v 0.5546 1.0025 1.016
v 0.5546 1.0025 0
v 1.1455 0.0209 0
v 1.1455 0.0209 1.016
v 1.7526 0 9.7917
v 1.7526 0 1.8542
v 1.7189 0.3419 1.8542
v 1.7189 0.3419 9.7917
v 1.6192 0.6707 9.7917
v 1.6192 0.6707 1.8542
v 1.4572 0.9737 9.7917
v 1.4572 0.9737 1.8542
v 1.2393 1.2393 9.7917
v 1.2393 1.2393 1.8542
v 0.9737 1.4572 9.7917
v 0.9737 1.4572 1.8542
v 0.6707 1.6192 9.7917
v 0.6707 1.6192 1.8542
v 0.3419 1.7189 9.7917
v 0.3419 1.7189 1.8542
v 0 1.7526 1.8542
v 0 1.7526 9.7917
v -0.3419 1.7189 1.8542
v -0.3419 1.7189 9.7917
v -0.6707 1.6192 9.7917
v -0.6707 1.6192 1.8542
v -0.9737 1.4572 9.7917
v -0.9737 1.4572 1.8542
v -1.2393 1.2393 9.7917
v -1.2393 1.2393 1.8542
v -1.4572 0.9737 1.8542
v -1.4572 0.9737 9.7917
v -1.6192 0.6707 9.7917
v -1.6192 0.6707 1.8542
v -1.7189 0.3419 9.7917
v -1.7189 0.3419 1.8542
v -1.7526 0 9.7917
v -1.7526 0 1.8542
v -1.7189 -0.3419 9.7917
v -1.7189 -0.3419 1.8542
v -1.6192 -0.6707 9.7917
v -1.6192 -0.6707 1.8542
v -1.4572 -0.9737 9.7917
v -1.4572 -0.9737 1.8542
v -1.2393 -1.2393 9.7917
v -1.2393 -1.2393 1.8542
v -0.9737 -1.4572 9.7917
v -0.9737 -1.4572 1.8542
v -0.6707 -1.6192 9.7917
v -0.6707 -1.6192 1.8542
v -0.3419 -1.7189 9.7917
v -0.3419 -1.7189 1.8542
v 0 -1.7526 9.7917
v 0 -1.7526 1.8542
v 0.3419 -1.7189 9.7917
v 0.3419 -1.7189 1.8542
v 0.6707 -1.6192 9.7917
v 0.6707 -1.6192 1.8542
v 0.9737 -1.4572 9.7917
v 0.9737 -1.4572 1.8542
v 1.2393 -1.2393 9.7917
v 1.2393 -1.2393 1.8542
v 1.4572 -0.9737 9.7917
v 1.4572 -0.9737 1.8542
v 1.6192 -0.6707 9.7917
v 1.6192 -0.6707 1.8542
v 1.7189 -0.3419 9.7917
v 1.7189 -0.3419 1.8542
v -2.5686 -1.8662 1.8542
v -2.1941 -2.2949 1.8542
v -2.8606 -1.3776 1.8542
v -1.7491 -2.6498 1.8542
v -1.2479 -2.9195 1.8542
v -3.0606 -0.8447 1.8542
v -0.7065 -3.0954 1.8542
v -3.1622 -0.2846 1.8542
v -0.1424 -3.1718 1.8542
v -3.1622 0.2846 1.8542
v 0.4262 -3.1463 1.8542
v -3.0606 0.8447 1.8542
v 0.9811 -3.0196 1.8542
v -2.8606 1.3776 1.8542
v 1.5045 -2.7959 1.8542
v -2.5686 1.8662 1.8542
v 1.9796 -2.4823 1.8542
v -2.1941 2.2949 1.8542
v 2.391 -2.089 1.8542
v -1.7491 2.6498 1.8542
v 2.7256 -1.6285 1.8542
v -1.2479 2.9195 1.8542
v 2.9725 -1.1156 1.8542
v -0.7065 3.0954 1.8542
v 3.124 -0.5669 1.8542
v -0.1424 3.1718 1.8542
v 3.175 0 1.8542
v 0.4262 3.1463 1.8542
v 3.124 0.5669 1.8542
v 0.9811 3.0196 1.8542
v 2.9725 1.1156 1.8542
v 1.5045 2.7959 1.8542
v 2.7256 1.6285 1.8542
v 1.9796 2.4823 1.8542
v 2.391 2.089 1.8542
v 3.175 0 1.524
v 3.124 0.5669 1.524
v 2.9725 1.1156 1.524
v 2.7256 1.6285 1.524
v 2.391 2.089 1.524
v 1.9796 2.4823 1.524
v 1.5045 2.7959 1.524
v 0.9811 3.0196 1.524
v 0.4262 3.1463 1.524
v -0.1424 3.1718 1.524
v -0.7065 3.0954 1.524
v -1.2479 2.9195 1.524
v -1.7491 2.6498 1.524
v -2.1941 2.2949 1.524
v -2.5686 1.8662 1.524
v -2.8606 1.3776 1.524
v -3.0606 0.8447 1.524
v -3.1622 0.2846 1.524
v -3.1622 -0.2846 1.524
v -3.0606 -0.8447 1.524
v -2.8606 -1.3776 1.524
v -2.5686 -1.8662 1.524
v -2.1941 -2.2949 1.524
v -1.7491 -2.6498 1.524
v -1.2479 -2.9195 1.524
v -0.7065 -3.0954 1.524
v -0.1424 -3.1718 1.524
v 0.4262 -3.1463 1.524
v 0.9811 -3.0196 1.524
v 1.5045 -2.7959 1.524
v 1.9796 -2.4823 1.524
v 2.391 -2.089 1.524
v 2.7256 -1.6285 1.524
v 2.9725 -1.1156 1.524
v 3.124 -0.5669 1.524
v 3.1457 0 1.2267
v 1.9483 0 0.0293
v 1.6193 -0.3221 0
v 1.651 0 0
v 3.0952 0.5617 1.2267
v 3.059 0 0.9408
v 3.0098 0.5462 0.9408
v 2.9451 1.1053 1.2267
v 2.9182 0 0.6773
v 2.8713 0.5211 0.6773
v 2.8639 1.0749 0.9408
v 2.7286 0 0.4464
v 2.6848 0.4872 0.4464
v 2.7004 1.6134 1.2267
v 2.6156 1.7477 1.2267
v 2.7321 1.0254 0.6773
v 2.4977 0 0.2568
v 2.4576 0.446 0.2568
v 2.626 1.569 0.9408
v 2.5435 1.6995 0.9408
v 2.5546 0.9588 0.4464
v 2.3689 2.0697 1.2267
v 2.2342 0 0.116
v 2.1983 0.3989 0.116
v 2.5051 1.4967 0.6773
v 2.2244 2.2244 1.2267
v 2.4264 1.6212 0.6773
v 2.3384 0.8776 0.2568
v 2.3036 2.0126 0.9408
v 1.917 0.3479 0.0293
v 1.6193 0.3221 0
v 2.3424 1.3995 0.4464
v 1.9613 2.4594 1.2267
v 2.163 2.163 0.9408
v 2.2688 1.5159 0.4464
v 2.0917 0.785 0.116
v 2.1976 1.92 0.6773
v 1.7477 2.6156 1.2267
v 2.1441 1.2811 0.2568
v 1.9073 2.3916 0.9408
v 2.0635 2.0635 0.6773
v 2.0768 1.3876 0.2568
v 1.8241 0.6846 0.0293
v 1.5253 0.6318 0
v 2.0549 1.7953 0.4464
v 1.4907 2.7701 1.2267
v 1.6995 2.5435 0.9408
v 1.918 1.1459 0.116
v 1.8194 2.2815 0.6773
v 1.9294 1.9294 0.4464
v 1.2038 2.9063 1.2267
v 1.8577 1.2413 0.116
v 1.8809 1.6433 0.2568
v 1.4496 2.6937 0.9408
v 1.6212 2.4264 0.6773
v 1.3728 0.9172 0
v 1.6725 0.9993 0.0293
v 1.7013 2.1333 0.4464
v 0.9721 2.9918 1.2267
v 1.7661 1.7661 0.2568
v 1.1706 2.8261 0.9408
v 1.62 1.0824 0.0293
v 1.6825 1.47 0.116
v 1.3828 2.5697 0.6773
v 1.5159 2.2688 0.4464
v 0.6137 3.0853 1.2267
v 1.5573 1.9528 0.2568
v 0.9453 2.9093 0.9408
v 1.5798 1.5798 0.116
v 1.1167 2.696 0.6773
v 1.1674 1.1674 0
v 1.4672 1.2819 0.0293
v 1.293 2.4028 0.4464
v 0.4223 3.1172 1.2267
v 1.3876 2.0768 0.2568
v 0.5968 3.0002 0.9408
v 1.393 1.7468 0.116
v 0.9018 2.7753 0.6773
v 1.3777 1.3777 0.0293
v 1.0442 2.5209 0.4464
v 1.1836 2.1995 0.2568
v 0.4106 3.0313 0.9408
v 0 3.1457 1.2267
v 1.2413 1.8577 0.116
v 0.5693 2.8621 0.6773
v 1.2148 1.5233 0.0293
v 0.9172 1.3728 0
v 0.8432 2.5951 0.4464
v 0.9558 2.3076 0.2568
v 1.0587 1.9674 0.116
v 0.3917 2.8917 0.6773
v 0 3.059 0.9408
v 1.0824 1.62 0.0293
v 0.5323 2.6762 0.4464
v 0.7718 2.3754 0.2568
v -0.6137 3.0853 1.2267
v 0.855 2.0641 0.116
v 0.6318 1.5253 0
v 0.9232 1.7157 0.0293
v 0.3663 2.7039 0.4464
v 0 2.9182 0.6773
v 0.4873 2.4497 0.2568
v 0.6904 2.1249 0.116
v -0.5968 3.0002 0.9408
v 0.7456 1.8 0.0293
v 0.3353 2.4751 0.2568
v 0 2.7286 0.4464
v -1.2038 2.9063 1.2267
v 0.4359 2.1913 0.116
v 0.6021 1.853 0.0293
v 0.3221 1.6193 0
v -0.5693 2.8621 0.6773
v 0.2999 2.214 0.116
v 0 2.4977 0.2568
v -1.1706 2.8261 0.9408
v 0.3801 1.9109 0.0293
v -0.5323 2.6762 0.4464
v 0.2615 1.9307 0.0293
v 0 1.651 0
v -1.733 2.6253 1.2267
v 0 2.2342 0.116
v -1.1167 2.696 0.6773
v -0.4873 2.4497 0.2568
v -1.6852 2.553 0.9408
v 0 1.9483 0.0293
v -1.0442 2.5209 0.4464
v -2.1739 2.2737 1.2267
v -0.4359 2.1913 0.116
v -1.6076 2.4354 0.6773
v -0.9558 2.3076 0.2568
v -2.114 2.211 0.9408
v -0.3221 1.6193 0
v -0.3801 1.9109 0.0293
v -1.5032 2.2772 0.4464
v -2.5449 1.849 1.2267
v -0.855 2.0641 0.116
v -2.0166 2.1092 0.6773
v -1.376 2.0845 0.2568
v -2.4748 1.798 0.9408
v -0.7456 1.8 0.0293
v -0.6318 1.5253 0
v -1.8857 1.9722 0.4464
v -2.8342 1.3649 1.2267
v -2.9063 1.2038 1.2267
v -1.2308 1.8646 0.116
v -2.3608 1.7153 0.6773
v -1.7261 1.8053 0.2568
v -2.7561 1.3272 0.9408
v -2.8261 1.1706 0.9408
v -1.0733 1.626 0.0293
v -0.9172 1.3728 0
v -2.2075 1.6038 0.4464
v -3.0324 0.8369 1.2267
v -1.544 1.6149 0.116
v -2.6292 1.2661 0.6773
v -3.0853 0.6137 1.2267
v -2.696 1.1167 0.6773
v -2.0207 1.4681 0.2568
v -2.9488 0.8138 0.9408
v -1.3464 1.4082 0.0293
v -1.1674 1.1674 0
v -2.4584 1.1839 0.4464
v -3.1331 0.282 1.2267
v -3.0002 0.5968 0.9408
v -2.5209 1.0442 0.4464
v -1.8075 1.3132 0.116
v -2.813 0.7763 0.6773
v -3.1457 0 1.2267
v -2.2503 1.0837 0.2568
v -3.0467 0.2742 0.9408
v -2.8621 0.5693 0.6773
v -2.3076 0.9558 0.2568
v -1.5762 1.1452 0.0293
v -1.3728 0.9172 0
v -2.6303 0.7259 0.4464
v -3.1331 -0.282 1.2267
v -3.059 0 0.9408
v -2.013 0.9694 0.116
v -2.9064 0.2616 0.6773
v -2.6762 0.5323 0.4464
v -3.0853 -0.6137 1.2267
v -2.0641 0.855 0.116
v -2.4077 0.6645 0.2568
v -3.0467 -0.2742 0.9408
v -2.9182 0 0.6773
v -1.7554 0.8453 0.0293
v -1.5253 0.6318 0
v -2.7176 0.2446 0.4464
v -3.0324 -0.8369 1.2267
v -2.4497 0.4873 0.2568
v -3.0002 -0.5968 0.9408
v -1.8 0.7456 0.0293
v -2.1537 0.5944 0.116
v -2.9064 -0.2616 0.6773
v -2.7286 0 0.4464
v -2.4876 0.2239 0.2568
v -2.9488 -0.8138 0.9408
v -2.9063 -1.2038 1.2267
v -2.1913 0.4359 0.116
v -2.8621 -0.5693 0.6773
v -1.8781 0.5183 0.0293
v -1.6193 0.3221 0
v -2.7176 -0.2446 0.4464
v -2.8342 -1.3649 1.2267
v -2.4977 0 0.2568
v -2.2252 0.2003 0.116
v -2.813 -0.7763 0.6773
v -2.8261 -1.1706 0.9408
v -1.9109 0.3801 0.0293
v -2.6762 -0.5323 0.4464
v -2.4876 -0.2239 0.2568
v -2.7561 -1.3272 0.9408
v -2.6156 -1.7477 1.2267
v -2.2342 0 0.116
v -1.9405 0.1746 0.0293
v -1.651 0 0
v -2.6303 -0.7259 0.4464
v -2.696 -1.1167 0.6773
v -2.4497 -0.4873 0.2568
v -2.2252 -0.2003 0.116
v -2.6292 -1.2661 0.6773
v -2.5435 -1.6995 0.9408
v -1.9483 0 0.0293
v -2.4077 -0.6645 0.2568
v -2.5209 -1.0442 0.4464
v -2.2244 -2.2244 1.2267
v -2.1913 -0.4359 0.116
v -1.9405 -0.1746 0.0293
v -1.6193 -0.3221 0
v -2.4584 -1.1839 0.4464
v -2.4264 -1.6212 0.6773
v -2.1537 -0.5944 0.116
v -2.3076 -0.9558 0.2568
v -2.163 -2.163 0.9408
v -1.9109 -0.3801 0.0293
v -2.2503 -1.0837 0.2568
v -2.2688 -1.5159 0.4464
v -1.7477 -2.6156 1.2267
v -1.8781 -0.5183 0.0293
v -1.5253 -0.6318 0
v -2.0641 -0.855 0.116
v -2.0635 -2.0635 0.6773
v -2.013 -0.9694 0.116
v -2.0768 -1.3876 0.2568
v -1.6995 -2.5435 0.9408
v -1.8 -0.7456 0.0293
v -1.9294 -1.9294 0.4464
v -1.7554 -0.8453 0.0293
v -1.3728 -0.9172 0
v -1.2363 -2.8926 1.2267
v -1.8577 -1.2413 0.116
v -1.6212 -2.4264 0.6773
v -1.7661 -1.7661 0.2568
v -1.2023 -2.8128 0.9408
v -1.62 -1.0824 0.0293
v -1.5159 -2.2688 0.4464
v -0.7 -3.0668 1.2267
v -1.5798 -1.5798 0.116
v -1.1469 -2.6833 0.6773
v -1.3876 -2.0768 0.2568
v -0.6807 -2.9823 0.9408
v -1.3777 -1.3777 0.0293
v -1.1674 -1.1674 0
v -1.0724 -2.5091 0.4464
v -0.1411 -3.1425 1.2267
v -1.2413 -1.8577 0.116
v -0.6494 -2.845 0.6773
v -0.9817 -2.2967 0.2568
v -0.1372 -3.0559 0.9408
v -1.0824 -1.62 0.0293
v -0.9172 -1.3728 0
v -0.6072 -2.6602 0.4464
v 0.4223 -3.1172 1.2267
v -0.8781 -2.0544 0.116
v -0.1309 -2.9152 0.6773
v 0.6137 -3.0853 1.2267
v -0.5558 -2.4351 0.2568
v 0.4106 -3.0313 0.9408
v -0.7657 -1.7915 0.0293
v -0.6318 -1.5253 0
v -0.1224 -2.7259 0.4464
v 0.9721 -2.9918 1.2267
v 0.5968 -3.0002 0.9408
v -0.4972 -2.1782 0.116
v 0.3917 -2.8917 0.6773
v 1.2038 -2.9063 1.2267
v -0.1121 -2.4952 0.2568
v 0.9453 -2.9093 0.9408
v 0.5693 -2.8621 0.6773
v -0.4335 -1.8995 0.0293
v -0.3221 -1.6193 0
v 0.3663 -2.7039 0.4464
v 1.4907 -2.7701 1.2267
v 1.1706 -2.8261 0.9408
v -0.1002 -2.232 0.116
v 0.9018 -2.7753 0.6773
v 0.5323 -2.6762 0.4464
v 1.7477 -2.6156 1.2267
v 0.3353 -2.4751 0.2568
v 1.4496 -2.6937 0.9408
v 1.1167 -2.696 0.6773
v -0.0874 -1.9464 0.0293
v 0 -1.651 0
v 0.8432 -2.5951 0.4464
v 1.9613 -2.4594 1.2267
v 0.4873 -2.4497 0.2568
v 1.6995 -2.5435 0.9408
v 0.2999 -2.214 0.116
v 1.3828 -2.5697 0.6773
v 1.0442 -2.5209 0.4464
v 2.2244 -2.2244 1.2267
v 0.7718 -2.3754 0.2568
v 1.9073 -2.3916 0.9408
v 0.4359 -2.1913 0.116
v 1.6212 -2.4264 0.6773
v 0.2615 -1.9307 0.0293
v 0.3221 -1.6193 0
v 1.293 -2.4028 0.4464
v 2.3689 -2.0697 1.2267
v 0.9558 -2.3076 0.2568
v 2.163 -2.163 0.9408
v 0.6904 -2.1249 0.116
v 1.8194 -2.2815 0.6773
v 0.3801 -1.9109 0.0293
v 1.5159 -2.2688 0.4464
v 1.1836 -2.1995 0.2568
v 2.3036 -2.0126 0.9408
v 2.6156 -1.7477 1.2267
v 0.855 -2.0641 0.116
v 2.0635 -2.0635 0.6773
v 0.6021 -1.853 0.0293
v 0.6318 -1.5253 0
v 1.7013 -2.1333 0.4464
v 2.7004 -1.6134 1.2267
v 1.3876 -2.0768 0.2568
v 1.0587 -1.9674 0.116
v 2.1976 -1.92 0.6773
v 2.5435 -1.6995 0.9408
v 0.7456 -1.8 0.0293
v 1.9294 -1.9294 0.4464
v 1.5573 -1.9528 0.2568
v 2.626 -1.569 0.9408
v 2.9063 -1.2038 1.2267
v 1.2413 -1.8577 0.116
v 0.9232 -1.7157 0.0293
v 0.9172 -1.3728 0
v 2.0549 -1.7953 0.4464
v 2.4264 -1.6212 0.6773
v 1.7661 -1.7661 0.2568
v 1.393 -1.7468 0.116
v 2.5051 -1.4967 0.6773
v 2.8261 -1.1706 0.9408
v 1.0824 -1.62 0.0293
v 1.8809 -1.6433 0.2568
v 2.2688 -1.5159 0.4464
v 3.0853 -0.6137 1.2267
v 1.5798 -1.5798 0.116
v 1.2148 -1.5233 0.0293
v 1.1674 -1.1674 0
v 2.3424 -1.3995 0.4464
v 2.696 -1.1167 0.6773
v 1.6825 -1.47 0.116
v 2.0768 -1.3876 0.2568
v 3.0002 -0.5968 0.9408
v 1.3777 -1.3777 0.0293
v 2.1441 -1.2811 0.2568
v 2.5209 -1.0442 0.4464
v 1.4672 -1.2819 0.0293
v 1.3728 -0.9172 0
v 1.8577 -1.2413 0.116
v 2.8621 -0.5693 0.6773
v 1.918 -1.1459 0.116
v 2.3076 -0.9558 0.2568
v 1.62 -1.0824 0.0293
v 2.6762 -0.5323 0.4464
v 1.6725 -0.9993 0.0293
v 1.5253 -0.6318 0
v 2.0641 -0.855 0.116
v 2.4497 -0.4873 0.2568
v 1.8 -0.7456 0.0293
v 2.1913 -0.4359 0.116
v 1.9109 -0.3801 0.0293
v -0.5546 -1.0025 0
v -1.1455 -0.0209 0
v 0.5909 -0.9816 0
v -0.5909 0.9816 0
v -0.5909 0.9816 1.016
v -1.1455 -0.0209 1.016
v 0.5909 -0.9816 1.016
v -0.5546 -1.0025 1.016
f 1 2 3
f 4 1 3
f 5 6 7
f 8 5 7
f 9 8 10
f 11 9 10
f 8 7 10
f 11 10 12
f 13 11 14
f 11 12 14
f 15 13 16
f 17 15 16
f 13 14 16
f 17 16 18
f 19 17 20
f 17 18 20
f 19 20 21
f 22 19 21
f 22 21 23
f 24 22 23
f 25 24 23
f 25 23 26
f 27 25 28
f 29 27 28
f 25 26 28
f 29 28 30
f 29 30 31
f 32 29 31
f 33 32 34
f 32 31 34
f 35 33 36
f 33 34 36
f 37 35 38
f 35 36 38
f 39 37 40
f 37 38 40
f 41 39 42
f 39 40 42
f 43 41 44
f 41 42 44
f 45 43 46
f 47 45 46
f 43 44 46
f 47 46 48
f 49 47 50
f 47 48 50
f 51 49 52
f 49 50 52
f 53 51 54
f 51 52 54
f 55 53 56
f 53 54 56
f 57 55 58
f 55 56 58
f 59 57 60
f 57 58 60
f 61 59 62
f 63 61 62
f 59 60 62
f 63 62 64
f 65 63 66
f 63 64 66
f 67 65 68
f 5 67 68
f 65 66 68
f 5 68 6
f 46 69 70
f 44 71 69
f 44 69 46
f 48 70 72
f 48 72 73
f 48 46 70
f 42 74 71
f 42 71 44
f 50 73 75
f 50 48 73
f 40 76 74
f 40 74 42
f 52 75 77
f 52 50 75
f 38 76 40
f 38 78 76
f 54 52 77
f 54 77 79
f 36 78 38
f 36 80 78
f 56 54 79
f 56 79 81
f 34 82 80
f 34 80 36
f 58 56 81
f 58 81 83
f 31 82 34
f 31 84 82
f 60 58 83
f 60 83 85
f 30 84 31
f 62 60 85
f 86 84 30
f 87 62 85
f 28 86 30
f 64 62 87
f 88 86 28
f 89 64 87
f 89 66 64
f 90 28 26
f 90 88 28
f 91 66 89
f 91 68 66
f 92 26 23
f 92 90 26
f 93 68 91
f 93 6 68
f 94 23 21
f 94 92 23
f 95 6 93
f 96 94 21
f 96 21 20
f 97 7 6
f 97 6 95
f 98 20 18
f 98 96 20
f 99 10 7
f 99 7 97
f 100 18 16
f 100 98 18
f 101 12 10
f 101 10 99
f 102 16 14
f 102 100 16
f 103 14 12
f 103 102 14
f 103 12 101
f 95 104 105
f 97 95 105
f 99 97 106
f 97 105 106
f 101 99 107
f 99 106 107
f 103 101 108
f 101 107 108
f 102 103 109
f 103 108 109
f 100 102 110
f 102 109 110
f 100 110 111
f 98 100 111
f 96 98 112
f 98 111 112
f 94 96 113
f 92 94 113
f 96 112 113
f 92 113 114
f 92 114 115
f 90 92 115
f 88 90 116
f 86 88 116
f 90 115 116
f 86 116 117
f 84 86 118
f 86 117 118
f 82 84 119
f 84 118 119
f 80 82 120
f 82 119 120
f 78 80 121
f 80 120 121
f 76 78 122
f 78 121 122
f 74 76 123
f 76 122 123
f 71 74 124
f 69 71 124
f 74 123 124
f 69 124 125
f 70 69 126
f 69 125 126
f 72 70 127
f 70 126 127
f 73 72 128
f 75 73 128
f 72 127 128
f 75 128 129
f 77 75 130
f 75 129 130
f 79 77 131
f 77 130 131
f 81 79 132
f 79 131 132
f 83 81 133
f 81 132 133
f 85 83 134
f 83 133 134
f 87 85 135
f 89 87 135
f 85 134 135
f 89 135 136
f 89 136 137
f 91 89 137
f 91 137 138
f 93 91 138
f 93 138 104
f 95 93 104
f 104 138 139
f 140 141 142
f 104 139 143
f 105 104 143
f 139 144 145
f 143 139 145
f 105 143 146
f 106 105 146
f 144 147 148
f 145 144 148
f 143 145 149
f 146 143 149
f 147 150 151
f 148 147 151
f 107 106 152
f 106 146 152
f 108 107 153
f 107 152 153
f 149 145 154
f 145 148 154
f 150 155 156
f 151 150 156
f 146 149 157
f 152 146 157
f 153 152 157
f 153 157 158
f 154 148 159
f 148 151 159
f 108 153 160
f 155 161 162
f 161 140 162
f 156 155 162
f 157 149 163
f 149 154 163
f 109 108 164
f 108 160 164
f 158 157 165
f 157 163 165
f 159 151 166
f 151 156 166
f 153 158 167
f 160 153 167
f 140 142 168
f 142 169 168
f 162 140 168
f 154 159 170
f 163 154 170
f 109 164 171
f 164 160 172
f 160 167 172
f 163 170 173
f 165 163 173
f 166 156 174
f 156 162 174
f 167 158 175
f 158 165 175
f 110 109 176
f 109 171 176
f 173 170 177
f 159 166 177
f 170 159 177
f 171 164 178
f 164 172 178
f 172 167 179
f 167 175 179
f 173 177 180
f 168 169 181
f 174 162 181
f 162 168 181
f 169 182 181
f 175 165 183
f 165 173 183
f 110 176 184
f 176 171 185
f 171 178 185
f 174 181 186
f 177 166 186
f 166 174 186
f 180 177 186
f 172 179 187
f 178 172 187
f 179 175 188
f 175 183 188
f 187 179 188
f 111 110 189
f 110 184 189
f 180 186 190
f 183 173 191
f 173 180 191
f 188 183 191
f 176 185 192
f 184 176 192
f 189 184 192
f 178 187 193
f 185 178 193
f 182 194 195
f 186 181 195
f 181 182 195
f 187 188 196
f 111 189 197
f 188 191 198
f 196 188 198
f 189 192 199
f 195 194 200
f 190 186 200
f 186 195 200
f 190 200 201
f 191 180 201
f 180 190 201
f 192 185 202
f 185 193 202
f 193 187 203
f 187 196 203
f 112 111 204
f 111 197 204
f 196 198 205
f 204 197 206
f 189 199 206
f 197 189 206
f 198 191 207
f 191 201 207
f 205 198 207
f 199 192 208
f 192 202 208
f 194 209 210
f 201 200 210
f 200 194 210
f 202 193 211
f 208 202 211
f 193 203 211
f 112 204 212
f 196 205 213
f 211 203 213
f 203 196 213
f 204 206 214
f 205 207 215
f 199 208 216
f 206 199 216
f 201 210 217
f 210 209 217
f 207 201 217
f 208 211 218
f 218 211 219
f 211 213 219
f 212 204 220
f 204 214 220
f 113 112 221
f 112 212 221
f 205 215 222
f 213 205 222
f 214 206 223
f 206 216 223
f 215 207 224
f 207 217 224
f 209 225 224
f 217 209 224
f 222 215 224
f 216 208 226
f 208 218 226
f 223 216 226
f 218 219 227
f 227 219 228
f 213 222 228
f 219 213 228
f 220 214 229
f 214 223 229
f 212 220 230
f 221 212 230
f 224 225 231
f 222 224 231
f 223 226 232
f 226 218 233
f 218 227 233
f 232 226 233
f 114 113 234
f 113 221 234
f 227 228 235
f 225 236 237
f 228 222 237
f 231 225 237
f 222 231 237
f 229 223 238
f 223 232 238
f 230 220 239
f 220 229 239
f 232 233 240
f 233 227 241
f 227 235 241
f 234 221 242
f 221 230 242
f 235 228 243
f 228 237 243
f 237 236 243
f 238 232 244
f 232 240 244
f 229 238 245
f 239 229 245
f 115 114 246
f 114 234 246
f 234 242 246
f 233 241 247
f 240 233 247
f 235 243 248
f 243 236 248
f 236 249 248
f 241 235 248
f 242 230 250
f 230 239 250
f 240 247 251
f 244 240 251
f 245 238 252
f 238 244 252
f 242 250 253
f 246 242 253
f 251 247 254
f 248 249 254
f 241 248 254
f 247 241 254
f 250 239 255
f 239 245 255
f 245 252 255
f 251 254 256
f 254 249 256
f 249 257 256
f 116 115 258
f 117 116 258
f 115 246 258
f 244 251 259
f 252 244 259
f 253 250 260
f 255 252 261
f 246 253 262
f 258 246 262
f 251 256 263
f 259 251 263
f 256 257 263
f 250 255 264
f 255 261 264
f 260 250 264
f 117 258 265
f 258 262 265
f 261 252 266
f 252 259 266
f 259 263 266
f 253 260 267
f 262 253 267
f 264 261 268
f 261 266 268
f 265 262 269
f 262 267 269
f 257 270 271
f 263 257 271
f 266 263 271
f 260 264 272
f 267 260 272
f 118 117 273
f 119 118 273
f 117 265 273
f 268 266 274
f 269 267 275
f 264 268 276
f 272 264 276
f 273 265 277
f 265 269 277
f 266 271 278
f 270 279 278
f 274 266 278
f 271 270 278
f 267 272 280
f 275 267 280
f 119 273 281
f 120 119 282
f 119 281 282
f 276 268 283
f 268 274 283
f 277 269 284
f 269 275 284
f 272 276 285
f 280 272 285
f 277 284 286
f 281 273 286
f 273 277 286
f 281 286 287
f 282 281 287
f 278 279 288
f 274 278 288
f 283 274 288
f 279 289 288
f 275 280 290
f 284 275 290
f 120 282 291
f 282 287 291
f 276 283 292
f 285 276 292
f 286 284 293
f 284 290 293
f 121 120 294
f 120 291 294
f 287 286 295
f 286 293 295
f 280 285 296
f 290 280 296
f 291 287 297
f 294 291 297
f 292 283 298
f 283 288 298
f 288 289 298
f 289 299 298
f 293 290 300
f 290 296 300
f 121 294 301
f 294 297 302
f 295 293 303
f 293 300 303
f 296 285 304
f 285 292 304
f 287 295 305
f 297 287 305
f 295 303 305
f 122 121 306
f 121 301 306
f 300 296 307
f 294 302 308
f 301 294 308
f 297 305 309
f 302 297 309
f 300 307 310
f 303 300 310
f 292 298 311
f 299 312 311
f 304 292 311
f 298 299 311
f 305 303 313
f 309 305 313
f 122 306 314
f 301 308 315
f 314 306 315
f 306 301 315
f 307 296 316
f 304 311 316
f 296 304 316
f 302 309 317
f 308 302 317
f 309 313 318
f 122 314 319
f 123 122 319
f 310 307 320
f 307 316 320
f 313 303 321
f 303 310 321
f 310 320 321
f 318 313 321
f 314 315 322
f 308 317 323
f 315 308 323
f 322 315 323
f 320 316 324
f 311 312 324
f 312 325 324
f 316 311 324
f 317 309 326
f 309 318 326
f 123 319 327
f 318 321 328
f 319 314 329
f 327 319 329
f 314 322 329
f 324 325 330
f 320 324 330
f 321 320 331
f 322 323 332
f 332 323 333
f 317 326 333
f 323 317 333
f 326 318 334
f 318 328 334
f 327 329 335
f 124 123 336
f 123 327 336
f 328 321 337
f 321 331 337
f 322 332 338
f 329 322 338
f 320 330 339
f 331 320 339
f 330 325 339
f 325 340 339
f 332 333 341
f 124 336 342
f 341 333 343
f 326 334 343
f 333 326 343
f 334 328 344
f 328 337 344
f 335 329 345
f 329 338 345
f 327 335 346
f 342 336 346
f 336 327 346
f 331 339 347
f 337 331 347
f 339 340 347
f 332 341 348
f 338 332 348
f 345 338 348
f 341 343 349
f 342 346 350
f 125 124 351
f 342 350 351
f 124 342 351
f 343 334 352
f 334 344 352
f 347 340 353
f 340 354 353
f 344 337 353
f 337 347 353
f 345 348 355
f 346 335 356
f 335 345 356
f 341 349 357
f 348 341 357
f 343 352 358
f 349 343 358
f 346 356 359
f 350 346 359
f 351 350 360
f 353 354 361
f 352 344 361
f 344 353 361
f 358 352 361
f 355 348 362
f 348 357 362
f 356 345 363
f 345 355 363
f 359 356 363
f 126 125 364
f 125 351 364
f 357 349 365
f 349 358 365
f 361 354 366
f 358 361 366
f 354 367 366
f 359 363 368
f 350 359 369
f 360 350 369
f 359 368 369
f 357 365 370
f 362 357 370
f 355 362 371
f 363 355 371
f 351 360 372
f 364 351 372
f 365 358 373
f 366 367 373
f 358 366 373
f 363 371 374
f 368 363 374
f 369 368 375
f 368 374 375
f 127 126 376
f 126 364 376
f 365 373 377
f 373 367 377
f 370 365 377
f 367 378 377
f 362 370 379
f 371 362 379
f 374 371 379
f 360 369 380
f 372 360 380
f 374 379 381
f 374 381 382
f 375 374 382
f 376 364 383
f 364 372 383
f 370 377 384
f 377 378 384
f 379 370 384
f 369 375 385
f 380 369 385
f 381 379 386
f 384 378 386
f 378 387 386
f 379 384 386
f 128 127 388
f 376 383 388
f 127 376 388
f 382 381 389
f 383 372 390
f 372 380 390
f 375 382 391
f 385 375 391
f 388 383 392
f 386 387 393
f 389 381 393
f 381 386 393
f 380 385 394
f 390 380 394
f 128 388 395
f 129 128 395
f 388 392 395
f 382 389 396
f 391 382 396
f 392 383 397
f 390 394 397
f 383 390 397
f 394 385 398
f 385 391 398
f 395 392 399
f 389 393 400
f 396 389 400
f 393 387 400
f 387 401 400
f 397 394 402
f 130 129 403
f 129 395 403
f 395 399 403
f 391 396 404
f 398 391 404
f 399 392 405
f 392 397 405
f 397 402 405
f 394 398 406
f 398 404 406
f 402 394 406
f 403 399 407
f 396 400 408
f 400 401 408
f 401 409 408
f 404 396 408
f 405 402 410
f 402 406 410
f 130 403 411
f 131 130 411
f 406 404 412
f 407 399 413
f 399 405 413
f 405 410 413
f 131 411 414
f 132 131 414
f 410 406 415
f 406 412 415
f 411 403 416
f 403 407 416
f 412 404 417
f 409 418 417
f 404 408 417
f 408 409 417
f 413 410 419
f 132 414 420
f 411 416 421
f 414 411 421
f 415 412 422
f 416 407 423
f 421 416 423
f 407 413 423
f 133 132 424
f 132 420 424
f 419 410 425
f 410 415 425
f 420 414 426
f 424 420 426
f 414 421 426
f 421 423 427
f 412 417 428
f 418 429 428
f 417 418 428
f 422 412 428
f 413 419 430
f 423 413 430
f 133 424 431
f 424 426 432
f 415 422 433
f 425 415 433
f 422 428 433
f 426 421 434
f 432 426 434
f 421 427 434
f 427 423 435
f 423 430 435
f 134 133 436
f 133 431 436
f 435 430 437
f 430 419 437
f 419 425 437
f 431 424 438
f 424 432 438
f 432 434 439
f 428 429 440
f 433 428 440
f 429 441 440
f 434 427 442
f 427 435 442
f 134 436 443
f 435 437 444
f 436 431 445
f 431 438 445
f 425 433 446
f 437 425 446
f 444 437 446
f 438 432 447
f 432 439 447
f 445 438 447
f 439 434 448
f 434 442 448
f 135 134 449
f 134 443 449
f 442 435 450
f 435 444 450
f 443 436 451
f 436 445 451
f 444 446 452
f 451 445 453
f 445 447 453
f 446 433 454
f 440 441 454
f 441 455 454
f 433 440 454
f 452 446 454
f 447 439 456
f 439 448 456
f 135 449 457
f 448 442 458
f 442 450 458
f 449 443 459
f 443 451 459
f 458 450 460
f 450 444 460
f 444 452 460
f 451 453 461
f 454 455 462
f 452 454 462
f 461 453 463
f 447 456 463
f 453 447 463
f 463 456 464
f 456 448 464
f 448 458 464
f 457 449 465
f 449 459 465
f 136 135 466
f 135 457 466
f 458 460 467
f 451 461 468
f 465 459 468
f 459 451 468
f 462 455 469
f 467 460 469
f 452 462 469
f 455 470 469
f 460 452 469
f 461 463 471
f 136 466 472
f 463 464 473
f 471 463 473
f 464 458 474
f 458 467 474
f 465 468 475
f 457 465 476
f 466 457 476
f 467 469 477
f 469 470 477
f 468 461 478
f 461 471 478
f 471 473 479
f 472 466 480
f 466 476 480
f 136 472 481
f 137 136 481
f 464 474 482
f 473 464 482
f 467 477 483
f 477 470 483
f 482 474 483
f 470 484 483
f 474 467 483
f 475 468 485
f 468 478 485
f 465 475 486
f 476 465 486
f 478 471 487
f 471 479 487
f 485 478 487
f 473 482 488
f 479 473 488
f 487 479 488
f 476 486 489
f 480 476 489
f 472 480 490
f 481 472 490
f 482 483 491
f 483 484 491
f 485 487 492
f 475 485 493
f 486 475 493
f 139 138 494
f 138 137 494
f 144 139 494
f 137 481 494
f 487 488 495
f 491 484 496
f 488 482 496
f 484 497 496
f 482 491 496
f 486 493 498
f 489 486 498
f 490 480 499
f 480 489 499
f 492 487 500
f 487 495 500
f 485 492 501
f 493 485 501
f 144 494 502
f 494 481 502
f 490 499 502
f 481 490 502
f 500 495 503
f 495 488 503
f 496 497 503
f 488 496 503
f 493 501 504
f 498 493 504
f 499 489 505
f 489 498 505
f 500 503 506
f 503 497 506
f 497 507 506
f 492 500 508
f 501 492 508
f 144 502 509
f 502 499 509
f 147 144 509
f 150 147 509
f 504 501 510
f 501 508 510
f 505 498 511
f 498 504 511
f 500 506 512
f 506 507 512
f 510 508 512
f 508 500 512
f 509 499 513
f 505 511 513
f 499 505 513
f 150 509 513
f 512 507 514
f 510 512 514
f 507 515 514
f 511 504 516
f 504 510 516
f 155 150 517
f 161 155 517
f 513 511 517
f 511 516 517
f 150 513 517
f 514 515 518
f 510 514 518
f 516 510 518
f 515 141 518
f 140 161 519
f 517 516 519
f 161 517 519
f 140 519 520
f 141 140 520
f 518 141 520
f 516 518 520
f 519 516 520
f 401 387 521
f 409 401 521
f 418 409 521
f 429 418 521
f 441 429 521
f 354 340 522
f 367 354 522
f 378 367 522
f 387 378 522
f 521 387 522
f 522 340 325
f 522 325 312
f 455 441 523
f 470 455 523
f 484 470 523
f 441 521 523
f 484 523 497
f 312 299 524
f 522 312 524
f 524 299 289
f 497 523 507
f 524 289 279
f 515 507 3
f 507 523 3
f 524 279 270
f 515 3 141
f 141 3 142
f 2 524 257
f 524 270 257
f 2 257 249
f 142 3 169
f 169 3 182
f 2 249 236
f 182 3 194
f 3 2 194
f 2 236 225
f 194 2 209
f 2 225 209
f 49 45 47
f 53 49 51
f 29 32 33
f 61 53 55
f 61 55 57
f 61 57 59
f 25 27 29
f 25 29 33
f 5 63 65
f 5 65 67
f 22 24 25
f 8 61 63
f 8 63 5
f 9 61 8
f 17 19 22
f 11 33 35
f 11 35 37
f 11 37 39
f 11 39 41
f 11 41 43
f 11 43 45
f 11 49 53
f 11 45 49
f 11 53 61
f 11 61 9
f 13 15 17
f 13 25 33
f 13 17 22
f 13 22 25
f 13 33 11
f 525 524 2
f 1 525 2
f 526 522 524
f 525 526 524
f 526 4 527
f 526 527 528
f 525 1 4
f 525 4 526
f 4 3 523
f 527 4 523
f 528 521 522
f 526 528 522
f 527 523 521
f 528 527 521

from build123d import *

# Parameters (mm, degrees)
SKETCH1_R      = 3.175
EXTRUDE1_DEPTH = 1.8542
FILLET1_R      = 1.524
SKETCH2_R      = 1.7526
EXTRUDE2_DEPTH = 7.9375
EXTRUDE3_DEPTH = 1.016


with BuildPart() as part:
    # Sketch1 → Extrude1 (new body)
    with BuildSketch(Plane.XY):
        Circle(SKETCH1_R)
    extrude(amount=EXTRUDE1_DEPTH)

    # Fillet1
    fillet1_edges = [part.edges().sort_by_distance(p)[0] for p in [
        (-3.175, 0, 0),
    ]]
    fillet(fillet1_edges, radius=FILLET1_R)

    # Sketch2 → Extrude2 (add)
    with BuildSketch(Plane.XY.offset(1.8542)):
        Circle(SKETCH2_R)
    extrude(amount=EXTRUDE2_DEPTH)

    # Sketch3 → Extrude3 (cut)
    with BuildSketch(Plane(origin=(0, 0, 0), x_dir=(-1, 0, 0), z_dir=(0, 0, -1))):
        Polygon((0.59085384, 0.981566666), (-0.554634748, 1.002477769), (-1.145488588, 0.020911103), (-0.59085384, -0.981566666), (0.554634748, -1.002477769), (1.145488588, -0.020911103), align=None)
    extrude(amount=-EXTRUDE3_DEPTH, mode=Mode.SUBTRACT)


solid = part.part
